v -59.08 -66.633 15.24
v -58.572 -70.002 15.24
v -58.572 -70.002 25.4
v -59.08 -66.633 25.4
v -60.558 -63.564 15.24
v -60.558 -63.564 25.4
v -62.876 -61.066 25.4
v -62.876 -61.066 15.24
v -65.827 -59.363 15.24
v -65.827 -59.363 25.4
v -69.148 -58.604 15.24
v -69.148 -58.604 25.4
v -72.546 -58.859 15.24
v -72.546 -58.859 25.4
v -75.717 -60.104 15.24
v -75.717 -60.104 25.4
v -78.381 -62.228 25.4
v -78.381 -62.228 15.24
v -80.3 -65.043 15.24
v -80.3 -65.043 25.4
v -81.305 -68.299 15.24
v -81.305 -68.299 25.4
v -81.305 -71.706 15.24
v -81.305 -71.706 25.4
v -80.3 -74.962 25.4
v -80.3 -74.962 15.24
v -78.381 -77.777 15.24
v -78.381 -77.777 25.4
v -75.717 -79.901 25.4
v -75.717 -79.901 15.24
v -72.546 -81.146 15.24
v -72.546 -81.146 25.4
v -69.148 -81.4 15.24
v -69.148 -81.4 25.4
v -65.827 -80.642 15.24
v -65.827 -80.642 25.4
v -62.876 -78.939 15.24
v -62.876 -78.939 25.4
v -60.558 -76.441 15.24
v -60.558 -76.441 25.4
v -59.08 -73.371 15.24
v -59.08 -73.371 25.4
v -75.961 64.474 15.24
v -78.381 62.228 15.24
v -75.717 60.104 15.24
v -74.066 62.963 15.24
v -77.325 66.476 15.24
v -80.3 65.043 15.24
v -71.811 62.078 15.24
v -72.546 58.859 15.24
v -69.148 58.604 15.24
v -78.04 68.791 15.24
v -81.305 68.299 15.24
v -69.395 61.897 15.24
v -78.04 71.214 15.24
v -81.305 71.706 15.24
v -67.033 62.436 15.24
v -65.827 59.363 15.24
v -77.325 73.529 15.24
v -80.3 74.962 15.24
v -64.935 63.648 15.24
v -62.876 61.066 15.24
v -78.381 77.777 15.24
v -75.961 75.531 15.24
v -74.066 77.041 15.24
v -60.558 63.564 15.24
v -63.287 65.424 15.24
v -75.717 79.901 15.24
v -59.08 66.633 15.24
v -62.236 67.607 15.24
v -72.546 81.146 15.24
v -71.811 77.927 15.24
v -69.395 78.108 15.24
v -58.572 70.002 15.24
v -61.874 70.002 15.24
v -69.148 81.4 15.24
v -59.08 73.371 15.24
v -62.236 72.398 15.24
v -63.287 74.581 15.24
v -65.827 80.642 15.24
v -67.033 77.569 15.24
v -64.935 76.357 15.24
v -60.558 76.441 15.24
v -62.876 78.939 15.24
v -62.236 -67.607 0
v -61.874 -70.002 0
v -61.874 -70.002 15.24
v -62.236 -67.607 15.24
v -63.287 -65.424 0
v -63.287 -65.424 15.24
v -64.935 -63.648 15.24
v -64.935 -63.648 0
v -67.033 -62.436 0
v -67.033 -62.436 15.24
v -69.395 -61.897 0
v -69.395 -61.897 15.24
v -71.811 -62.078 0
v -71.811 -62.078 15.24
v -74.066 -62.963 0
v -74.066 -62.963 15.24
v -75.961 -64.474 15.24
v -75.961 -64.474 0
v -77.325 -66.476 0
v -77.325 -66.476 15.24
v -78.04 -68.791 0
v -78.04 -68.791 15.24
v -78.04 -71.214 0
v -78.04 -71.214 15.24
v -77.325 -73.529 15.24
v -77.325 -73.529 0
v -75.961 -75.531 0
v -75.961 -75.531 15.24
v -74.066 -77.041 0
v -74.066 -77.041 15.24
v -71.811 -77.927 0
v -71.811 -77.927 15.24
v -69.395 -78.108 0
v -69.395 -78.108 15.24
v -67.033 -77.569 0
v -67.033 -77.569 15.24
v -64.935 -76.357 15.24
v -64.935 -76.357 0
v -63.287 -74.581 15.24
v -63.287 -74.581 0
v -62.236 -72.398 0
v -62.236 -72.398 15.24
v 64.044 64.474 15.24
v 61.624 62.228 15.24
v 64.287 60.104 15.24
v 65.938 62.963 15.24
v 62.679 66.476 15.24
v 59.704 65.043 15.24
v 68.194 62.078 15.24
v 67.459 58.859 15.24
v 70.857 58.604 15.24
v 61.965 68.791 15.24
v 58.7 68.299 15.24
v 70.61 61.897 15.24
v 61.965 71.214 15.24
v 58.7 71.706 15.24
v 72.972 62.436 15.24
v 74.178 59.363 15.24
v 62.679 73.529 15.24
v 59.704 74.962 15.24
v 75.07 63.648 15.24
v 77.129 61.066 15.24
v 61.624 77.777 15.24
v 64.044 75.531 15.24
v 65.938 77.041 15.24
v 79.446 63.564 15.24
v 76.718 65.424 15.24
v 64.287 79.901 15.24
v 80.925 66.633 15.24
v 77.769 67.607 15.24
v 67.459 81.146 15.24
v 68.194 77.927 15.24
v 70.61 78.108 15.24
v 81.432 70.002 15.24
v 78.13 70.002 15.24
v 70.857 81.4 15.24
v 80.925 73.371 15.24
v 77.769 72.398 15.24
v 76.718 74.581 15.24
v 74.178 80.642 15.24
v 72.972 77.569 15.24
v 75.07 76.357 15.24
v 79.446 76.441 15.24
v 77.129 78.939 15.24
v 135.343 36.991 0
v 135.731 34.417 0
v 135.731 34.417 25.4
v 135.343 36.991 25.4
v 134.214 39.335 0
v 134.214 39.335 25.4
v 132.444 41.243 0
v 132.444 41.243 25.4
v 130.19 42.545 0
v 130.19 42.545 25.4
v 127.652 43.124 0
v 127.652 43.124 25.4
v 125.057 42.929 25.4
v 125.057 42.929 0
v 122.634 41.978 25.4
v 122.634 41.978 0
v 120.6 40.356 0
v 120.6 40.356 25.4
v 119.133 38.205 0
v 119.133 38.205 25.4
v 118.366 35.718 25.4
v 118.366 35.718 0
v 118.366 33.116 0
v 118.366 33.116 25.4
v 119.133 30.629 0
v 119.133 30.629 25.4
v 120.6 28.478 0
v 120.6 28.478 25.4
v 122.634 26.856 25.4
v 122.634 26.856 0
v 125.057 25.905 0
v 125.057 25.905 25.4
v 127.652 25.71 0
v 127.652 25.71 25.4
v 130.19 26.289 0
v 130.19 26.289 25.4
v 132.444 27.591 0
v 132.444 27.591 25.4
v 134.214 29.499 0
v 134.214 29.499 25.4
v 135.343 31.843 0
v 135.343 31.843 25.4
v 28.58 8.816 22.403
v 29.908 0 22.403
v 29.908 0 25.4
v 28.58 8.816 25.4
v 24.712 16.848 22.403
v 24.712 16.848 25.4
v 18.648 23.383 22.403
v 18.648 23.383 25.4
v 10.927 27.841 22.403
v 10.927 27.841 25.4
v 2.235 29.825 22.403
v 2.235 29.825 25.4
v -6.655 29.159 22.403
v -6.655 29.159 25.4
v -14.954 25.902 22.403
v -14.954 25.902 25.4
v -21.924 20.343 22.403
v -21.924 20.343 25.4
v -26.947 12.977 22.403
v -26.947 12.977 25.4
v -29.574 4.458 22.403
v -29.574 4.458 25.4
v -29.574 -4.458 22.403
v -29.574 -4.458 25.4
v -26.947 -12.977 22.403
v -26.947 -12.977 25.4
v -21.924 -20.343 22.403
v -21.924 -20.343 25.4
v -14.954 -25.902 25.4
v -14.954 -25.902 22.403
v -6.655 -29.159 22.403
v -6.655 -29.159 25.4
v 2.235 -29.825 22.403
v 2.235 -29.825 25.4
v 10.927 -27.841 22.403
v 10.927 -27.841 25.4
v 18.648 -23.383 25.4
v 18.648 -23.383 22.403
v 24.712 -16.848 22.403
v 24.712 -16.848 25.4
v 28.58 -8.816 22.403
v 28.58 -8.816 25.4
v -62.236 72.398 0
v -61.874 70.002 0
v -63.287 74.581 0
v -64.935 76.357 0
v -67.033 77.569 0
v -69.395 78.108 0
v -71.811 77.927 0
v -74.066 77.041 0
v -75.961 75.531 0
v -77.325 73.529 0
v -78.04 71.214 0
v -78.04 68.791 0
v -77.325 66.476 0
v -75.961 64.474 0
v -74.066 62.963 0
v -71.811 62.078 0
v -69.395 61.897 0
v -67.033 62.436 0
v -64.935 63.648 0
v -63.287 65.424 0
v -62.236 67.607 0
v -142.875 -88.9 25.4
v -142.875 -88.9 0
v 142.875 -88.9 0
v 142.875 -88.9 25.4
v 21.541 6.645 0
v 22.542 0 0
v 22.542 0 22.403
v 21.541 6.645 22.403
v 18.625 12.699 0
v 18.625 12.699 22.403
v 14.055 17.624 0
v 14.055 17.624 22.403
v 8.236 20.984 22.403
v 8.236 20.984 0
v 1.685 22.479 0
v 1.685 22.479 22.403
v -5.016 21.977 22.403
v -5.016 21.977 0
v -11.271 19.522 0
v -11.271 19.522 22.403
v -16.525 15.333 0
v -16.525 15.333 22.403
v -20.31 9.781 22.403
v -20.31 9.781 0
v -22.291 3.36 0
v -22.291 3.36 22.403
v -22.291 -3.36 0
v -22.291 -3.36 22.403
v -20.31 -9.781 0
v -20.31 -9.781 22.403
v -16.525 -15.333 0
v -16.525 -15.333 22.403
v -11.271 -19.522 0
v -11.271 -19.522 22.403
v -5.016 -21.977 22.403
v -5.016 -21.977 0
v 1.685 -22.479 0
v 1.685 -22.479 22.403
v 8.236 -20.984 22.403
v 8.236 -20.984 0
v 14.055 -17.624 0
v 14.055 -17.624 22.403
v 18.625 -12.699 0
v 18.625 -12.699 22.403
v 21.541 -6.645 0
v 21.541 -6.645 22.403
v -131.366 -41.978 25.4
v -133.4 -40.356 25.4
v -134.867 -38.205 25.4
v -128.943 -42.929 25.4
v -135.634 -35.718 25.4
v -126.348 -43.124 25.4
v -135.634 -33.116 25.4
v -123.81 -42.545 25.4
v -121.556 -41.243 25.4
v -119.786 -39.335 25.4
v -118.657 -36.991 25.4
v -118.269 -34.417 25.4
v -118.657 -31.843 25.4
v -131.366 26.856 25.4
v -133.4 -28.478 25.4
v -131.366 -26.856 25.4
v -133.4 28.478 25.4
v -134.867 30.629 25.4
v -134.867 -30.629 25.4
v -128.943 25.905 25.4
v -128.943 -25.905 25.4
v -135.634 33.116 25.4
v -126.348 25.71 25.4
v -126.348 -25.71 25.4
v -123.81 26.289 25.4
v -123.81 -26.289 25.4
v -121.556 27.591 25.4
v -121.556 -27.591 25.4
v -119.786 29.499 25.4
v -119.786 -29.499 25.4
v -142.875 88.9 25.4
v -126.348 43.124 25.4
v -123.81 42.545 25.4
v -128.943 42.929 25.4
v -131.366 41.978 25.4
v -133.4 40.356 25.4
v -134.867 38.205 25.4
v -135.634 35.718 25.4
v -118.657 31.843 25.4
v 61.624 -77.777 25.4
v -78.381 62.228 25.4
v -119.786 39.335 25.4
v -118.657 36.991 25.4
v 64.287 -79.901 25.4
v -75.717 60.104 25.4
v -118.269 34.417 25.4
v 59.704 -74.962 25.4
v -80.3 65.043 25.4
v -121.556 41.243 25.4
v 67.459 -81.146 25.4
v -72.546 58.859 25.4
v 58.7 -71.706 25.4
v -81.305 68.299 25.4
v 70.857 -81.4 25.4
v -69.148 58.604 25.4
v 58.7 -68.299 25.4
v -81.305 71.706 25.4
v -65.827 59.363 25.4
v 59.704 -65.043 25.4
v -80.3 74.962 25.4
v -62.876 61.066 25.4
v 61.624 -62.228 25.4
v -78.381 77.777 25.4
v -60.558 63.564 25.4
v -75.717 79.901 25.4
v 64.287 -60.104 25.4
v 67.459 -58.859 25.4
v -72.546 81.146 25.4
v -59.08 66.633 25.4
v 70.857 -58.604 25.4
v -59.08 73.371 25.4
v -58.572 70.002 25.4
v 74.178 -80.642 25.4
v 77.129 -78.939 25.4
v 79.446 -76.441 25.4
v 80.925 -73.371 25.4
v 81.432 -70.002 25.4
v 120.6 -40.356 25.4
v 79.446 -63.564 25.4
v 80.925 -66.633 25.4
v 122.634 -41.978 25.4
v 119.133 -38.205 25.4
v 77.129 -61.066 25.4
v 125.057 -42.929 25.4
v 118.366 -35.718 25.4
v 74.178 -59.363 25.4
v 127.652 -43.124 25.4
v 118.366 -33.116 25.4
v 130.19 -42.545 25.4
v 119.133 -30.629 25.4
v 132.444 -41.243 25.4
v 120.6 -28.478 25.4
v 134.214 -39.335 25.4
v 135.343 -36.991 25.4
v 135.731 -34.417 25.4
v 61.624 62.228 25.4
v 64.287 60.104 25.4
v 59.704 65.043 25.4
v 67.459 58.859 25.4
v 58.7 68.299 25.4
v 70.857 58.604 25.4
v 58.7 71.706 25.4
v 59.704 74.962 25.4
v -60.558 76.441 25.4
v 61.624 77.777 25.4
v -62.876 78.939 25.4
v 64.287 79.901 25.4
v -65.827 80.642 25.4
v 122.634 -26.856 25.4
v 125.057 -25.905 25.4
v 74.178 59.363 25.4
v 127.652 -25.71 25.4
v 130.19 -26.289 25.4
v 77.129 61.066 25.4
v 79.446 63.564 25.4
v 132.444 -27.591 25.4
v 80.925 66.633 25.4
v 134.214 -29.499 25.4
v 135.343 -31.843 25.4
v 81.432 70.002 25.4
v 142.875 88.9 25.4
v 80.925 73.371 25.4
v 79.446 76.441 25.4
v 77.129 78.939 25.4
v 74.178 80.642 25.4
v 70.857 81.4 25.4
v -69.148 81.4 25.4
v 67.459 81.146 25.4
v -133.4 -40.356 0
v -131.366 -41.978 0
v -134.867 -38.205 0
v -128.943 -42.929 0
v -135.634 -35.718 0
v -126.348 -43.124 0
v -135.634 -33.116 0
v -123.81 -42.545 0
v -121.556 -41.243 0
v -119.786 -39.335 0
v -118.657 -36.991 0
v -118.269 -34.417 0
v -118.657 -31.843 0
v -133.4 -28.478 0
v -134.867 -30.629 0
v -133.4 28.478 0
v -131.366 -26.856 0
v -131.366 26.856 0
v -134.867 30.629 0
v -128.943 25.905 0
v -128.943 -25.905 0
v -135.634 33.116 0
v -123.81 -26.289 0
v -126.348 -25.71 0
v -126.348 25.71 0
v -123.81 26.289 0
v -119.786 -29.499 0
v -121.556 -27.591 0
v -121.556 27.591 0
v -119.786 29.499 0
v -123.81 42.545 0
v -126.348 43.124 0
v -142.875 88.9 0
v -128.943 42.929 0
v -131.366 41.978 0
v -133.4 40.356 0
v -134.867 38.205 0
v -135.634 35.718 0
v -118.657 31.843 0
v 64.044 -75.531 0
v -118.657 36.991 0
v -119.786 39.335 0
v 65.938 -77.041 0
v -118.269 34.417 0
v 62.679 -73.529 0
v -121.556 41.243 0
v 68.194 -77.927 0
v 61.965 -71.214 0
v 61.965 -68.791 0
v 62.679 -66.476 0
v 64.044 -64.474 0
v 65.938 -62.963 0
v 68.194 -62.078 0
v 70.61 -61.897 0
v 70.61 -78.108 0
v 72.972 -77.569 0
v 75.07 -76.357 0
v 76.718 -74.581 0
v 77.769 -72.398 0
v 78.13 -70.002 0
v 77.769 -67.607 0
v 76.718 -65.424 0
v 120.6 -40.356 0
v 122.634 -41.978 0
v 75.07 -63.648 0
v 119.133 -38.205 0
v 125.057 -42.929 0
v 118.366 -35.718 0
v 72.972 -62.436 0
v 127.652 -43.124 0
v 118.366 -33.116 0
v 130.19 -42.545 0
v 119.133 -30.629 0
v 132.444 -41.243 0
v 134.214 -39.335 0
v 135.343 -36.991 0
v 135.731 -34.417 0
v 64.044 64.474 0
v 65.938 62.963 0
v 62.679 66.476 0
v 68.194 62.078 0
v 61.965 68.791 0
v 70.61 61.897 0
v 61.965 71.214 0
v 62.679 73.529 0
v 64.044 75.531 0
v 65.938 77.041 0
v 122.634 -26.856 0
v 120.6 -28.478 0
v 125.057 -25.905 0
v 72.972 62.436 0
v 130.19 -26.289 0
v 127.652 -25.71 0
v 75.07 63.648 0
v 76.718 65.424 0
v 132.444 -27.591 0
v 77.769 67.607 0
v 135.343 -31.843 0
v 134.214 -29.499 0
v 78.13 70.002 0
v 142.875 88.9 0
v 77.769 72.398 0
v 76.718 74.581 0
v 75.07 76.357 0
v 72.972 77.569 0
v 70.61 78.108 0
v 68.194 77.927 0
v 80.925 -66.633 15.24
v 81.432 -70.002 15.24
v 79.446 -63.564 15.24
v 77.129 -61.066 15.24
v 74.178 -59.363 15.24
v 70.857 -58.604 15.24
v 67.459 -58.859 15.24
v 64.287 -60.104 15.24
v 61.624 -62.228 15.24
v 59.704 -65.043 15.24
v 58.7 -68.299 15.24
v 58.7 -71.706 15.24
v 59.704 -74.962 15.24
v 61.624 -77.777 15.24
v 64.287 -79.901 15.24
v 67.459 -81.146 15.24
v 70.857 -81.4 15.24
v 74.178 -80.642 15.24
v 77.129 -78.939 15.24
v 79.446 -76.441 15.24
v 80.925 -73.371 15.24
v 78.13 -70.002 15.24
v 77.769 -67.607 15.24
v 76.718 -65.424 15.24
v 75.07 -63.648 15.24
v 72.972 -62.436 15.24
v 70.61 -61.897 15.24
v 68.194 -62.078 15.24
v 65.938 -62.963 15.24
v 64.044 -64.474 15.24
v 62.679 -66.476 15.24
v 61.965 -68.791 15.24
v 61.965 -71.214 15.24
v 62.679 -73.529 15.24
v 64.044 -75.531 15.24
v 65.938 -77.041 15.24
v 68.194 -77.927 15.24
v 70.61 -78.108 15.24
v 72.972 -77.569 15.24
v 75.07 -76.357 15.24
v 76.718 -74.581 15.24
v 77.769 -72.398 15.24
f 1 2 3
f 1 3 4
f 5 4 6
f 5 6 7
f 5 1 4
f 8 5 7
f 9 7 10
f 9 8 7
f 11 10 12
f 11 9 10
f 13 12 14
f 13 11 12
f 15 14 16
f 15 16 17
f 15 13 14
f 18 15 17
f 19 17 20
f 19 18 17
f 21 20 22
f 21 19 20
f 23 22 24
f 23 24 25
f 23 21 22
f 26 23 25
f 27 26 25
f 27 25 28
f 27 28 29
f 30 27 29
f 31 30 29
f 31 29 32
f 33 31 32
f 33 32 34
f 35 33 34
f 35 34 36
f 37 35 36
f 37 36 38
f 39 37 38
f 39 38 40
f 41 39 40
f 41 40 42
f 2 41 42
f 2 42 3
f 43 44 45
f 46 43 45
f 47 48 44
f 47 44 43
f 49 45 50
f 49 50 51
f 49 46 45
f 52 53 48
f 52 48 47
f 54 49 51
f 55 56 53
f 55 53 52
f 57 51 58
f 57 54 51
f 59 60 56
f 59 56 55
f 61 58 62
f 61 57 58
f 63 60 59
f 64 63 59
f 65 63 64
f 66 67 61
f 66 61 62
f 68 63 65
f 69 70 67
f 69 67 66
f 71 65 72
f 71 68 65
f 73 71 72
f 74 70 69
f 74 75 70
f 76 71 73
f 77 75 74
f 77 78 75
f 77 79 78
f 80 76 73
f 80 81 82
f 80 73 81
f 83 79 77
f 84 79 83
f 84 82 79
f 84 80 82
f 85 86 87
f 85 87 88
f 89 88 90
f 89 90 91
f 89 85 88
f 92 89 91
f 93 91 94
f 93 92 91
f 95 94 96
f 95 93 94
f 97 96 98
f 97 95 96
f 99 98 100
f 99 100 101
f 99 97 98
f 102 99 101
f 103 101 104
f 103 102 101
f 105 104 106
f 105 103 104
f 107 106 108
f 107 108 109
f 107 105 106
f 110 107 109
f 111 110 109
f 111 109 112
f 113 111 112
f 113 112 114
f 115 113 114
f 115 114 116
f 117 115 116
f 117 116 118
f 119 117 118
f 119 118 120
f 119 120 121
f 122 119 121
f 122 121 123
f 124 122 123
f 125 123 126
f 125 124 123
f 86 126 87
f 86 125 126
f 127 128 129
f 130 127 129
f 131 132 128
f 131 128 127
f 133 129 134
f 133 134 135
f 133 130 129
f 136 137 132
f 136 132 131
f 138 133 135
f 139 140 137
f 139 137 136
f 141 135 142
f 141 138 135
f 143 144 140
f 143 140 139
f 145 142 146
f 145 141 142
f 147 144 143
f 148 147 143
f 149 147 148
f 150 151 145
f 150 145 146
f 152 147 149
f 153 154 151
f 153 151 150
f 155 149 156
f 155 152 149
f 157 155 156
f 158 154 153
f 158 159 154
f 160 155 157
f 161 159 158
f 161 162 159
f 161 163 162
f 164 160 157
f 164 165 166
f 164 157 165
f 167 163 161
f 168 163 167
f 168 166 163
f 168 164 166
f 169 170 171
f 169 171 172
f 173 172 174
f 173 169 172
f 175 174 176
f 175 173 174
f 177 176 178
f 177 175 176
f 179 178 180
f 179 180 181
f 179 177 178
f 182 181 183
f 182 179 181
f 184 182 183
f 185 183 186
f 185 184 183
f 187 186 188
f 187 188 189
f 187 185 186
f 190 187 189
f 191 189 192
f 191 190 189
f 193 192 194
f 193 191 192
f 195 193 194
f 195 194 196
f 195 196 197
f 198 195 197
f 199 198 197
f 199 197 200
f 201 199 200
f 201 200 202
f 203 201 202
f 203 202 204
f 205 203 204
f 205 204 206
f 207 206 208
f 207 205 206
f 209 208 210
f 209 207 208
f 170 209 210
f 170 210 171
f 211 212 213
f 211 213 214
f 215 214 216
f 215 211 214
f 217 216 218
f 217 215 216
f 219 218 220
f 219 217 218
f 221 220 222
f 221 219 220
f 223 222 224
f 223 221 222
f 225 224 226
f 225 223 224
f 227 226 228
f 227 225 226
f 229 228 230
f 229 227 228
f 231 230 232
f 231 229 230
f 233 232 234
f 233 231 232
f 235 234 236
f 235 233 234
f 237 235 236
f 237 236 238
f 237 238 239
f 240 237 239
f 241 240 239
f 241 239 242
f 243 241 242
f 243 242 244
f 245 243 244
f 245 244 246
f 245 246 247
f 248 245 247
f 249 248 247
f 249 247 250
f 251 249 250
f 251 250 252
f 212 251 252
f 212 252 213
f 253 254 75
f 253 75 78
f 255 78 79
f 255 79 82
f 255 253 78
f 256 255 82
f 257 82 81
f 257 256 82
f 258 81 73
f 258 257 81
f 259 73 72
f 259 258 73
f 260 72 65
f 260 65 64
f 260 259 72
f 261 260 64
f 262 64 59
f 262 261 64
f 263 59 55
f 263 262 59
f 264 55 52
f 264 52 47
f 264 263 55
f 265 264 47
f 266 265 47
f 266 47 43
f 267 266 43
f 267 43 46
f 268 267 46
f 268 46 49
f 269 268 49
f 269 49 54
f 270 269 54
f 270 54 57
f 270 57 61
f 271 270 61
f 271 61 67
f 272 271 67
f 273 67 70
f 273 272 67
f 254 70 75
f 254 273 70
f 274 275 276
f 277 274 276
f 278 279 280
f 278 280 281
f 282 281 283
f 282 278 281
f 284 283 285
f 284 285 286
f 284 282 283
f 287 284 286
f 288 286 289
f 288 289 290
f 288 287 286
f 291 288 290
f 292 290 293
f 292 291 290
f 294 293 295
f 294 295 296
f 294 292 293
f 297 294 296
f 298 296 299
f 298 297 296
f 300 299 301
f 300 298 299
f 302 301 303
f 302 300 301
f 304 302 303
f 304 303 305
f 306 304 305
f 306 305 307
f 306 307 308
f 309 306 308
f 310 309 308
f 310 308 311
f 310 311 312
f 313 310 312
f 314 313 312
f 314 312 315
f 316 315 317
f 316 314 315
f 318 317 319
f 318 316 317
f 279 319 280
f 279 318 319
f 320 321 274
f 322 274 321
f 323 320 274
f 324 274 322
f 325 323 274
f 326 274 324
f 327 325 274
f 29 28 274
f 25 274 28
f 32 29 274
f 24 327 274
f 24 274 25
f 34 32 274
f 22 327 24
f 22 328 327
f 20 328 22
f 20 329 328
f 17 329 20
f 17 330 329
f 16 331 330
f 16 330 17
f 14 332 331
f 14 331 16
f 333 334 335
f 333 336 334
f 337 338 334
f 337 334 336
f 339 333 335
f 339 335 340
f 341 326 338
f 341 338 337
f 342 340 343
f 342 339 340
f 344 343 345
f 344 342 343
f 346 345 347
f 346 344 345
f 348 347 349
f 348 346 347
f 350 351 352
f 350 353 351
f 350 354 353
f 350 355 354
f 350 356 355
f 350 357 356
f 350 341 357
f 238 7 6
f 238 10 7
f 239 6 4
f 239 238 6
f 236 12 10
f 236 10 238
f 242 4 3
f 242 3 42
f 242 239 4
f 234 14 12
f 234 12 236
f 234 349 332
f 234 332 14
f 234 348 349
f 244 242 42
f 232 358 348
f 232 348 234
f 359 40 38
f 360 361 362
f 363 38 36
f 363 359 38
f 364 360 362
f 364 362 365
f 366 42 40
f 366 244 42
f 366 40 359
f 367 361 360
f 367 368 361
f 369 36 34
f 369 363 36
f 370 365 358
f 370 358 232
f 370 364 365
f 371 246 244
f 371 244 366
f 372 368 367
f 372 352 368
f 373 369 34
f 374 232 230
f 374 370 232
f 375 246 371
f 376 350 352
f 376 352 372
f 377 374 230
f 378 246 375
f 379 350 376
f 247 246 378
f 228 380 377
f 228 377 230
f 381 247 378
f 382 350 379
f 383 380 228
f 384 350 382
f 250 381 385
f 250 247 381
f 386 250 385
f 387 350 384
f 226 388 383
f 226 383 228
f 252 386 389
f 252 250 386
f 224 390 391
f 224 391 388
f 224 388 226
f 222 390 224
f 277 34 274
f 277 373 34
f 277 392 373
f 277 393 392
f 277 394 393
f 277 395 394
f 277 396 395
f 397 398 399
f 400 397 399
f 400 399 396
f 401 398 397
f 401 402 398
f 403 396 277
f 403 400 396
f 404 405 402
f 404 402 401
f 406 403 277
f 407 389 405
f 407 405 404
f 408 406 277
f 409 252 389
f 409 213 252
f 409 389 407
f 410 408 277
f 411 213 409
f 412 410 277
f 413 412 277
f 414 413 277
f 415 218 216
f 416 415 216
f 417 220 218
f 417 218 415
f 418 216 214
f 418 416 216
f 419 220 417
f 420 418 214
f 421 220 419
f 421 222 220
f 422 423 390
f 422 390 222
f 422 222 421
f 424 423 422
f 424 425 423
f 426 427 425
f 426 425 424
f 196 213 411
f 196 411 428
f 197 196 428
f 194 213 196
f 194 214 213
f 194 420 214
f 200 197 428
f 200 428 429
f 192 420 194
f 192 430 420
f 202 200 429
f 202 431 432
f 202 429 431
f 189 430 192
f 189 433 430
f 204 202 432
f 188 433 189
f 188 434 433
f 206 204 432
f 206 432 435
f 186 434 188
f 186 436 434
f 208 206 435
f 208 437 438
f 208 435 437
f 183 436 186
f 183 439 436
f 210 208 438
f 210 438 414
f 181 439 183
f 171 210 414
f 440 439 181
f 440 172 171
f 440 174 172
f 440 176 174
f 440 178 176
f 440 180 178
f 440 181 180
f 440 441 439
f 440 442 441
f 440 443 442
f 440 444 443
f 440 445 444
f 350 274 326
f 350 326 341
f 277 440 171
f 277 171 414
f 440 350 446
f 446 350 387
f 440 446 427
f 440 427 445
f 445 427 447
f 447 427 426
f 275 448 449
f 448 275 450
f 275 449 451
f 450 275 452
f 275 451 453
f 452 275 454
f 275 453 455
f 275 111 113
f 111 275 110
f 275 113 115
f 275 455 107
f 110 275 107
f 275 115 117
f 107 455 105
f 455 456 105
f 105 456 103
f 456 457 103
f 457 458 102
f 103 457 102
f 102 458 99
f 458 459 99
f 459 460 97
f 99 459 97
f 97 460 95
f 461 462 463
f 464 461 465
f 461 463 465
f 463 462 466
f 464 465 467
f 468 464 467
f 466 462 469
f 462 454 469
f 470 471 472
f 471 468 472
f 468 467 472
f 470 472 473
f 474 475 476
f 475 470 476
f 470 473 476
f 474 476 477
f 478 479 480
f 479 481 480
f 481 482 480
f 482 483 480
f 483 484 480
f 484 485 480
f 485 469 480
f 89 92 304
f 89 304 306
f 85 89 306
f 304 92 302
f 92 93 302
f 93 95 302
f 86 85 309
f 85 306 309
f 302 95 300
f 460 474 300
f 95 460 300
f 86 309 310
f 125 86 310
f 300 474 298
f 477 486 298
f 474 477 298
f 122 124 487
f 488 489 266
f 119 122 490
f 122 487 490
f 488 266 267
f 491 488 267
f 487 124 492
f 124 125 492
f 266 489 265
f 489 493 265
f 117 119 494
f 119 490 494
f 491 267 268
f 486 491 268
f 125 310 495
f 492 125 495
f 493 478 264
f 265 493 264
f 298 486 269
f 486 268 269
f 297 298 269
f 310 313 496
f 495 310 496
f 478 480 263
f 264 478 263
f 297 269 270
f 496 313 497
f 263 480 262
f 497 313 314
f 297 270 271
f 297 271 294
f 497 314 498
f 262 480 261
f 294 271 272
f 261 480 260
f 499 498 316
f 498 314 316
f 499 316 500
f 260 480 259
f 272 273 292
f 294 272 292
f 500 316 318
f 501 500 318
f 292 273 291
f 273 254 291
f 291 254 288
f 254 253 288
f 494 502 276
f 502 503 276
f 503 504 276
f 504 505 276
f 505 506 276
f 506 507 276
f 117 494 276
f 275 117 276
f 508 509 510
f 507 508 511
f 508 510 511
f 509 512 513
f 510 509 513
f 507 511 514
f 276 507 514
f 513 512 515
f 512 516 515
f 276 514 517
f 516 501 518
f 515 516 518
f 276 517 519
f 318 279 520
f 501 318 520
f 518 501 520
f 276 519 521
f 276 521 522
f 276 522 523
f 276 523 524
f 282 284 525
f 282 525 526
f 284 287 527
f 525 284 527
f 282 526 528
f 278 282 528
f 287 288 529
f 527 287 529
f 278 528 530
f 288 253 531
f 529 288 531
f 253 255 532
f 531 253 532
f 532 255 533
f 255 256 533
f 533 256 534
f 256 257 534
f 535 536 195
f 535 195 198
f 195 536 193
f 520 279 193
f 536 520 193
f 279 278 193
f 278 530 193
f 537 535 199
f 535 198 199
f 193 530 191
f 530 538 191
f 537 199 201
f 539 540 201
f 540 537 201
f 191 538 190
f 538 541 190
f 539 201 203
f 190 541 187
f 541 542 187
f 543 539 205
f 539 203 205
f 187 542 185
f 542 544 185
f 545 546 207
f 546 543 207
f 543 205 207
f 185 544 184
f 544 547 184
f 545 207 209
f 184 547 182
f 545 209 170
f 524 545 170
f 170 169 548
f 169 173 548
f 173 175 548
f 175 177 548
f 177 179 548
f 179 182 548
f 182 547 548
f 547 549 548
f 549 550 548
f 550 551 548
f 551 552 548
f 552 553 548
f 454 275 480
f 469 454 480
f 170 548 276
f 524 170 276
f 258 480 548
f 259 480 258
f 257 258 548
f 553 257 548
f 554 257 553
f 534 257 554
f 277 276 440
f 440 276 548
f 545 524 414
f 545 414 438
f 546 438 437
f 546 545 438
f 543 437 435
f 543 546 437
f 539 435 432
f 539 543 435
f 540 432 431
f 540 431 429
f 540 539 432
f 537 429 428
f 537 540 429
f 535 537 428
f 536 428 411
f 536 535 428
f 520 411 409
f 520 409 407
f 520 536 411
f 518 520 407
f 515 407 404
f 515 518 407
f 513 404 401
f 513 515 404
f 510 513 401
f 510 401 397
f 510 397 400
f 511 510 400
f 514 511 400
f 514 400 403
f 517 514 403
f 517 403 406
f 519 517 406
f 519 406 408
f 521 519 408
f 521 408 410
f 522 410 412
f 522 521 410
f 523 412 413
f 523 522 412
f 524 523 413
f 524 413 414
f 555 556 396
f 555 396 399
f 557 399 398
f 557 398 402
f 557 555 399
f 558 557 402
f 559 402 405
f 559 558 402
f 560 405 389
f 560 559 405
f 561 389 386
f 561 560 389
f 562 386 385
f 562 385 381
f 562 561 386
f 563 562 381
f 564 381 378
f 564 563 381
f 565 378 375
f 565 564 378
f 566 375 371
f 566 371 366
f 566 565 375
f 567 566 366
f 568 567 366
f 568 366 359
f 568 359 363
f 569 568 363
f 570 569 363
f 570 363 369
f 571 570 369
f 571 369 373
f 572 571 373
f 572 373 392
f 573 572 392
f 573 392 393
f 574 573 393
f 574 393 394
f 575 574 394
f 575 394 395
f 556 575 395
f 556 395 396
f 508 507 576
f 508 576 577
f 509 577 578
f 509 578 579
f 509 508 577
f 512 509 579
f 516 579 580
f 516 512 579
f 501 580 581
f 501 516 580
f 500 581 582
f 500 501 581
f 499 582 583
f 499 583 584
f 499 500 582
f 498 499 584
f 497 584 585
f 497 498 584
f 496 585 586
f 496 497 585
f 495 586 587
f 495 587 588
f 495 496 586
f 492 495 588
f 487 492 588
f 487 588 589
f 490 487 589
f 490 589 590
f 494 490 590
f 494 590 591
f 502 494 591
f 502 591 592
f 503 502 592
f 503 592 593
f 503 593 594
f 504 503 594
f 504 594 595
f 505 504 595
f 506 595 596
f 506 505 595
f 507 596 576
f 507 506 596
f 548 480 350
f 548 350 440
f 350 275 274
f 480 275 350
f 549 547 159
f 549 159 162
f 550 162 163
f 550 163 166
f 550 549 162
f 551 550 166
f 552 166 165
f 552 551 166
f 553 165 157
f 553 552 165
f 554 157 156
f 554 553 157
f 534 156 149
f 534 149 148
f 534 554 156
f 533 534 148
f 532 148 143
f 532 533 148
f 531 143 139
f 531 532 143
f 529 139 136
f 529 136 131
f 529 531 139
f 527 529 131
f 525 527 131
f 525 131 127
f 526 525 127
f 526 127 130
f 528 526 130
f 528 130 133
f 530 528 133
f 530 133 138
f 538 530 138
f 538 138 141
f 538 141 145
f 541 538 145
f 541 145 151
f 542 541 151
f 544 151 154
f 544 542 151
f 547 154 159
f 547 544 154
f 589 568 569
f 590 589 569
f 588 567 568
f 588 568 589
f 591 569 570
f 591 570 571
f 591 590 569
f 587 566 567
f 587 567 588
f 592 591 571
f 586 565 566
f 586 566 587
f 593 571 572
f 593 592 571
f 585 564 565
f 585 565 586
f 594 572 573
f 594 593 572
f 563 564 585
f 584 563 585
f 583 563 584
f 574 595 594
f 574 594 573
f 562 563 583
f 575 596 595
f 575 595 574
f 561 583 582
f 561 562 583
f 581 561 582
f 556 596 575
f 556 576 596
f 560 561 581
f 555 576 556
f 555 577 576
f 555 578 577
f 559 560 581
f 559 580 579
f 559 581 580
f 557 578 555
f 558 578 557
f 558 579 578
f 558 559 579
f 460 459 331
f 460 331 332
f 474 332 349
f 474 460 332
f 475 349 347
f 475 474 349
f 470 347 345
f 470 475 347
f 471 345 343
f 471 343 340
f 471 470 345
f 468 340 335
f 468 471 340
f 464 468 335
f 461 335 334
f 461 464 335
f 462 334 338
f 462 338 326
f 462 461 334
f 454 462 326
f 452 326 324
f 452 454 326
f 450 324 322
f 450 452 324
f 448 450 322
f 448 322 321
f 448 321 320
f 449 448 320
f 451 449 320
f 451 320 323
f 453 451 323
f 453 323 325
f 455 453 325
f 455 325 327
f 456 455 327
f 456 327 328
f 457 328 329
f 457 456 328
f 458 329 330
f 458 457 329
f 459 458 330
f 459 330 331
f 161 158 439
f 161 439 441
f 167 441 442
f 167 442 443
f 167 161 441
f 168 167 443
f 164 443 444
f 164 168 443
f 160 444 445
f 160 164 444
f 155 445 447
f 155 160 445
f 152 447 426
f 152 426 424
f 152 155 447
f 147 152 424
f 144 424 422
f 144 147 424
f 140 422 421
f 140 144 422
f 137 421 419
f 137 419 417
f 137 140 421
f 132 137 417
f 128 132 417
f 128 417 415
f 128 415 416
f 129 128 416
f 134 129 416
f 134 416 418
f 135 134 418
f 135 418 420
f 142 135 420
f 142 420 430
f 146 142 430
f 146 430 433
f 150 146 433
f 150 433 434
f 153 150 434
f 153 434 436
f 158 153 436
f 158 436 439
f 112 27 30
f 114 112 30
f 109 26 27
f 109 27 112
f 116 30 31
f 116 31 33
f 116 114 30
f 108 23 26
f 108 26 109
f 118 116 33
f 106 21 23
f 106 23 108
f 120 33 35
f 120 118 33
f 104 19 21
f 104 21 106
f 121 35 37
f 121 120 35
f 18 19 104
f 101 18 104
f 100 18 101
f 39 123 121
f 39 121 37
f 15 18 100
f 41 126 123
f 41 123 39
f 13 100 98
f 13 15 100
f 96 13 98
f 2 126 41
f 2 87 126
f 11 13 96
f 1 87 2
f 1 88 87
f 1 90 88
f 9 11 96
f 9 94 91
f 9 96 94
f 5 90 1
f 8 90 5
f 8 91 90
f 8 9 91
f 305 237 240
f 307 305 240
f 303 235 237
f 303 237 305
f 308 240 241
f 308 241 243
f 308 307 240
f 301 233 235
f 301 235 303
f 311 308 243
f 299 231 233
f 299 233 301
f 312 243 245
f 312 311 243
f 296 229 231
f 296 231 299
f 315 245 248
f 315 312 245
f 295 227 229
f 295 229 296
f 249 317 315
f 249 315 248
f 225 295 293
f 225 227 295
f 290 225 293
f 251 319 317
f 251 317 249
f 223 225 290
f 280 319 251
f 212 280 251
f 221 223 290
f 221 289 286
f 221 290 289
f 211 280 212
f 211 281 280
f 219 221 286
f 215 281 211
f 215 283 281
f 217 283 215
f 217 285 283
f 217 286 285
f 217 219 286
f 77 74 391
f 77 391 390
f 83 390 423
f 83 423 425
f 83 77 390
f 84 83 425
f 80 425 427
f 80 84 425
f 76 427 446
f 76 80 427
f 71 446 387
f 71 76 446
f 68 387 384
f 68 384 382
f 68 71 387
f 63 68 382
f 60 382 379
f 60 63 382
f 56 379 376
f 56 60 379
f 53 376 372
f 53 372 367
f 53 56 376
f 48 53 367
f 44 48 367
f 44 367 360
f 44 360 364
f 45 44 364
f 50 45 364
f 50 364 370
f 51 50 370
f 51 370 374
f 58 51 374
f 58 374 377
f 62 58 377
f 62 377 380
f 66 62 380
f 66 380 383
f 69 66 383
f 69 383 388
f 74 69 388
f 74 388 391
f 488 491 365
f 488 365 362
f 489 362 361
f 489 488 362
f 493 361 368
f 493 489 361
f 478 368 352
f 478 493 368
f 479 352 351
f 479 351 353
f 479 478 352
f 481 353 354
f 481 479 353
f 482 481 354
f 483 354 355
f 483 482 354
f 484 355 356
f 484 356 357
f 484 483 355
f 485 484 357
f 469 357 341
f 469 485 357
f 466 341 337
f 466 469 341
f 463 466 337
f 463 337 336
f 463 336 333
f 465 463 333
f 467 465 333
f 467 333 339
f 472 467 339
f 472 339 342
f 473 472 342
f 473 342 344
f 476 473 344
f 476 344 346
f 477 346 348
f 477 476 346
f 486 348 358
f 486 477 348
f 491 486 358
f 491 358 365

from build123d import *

# Parameters (mm, degrees)
F0_W     = 285.75
F0_H     = 177.8
F0_R     = 11.43
F0_R_2   = 8.73125
F0_R_3   = 29.9085
F1_DEPTH = 25.4
F0_R_4   = 22.5425
F2_DEPTH = 22.4028
F0_R_5   = 8.128
F3_DEPTH = 15.24
F4_DEPTH = 15.24
F5_DEPTH = 15.24
F6_DEPTH = 15.24


with BuildPart() as f1:
    # F0 (on Top) → F1 (new body)
    with BuildSketch(Plane.XY):
        Rectangle(F0_W, F0_H)
        with Locations((-70.0024, -70.0024)):
            Circle(F0_R, mode=Mode.SUBTRACT)
        with Locations((-127, -34.417)):
            Circle(F0_R_2, mode=Mode.SUBTRACT)
        with Locations((70.0024, -70.0024)):
            Circle(F0_R, mode=Mode.SUBTRACT)
        with Locations((127, -34.417)):
            Circle(F0_R_2, mode=Mode.SUBTRACT)
        with Locations((-127, 34.417)):
            Circle(F0_R_2, mode=Mode.SUBTRACT)
        with Locations((-70.0024, 70.0024)):
            Circle(F0_R, mode=Mode.SUBTRACT)
        Circle(F0_R_3, mode=Mode.SUBTRACT)
        with Locations((127, 34.417)):
            Circle(F0_R_2, mode=Mode.SUBTRACT)
        with Locations((70.0024, 70.0024)):
            Circle(F0_R, mode=Mode.SUBTRACT)
    extrude(amount=F1_DEPTH)

    # F0 (on Top) → F2 (join)
    with BuildSketch(Plane.XY):
        Circle(F0_R_3)
        Circle(F0_R_4, mode=Mode.SUBTRACT)
    extrude(amount=F2_DEPTH)

    # F0 (on Top) → F3 (join)
    with BuildSketch(Plane.XY):
        with Locations((-70.0024, 70.0024)):
            Circle(F0_R)
        with Locations((-70.0024, 70.0024)):
            Circle(F0_R_5, mode=Mode.SUBTRACT)
    extrude(amount=F3_DEPTH)

    # F0 (on Top) → F4 (join)
    with BuildSketch(Plane.XY):
        with Locations((70.0024, 70.0024)):
            Circle(F0_R)
        with Locations((70.0024, 70.0024)):
            Circle(F0_R_5, mode=Mode.SUBTRACT)
    extrude(amount=F4_DEPTH)

    # F0 (on Top) → F5 (join)
    with BuildSketch(Plane.XY):
        with Locations((-70.0024, -70.0024)):
            Circle(F0_R)
        with Locations((-70.0024, -70.0024)):
            Circle(F0_R_5, mode=Mode.SUBTRACT)
    extrude(amount=F5_DEPTH)

    # F0 (on Top) → F6 (join)
    with BuildSketch(Plane.XY):
        with Locations((70.0024, -70.0024)):
            Circle(F0_R)
        with Locations((70.0024, -70.0024)):
            Circle(F0_R_5, mode=Mode.SUBTRACT)
    extrude(amount=F6_DEPTH)


solid = f1.part
